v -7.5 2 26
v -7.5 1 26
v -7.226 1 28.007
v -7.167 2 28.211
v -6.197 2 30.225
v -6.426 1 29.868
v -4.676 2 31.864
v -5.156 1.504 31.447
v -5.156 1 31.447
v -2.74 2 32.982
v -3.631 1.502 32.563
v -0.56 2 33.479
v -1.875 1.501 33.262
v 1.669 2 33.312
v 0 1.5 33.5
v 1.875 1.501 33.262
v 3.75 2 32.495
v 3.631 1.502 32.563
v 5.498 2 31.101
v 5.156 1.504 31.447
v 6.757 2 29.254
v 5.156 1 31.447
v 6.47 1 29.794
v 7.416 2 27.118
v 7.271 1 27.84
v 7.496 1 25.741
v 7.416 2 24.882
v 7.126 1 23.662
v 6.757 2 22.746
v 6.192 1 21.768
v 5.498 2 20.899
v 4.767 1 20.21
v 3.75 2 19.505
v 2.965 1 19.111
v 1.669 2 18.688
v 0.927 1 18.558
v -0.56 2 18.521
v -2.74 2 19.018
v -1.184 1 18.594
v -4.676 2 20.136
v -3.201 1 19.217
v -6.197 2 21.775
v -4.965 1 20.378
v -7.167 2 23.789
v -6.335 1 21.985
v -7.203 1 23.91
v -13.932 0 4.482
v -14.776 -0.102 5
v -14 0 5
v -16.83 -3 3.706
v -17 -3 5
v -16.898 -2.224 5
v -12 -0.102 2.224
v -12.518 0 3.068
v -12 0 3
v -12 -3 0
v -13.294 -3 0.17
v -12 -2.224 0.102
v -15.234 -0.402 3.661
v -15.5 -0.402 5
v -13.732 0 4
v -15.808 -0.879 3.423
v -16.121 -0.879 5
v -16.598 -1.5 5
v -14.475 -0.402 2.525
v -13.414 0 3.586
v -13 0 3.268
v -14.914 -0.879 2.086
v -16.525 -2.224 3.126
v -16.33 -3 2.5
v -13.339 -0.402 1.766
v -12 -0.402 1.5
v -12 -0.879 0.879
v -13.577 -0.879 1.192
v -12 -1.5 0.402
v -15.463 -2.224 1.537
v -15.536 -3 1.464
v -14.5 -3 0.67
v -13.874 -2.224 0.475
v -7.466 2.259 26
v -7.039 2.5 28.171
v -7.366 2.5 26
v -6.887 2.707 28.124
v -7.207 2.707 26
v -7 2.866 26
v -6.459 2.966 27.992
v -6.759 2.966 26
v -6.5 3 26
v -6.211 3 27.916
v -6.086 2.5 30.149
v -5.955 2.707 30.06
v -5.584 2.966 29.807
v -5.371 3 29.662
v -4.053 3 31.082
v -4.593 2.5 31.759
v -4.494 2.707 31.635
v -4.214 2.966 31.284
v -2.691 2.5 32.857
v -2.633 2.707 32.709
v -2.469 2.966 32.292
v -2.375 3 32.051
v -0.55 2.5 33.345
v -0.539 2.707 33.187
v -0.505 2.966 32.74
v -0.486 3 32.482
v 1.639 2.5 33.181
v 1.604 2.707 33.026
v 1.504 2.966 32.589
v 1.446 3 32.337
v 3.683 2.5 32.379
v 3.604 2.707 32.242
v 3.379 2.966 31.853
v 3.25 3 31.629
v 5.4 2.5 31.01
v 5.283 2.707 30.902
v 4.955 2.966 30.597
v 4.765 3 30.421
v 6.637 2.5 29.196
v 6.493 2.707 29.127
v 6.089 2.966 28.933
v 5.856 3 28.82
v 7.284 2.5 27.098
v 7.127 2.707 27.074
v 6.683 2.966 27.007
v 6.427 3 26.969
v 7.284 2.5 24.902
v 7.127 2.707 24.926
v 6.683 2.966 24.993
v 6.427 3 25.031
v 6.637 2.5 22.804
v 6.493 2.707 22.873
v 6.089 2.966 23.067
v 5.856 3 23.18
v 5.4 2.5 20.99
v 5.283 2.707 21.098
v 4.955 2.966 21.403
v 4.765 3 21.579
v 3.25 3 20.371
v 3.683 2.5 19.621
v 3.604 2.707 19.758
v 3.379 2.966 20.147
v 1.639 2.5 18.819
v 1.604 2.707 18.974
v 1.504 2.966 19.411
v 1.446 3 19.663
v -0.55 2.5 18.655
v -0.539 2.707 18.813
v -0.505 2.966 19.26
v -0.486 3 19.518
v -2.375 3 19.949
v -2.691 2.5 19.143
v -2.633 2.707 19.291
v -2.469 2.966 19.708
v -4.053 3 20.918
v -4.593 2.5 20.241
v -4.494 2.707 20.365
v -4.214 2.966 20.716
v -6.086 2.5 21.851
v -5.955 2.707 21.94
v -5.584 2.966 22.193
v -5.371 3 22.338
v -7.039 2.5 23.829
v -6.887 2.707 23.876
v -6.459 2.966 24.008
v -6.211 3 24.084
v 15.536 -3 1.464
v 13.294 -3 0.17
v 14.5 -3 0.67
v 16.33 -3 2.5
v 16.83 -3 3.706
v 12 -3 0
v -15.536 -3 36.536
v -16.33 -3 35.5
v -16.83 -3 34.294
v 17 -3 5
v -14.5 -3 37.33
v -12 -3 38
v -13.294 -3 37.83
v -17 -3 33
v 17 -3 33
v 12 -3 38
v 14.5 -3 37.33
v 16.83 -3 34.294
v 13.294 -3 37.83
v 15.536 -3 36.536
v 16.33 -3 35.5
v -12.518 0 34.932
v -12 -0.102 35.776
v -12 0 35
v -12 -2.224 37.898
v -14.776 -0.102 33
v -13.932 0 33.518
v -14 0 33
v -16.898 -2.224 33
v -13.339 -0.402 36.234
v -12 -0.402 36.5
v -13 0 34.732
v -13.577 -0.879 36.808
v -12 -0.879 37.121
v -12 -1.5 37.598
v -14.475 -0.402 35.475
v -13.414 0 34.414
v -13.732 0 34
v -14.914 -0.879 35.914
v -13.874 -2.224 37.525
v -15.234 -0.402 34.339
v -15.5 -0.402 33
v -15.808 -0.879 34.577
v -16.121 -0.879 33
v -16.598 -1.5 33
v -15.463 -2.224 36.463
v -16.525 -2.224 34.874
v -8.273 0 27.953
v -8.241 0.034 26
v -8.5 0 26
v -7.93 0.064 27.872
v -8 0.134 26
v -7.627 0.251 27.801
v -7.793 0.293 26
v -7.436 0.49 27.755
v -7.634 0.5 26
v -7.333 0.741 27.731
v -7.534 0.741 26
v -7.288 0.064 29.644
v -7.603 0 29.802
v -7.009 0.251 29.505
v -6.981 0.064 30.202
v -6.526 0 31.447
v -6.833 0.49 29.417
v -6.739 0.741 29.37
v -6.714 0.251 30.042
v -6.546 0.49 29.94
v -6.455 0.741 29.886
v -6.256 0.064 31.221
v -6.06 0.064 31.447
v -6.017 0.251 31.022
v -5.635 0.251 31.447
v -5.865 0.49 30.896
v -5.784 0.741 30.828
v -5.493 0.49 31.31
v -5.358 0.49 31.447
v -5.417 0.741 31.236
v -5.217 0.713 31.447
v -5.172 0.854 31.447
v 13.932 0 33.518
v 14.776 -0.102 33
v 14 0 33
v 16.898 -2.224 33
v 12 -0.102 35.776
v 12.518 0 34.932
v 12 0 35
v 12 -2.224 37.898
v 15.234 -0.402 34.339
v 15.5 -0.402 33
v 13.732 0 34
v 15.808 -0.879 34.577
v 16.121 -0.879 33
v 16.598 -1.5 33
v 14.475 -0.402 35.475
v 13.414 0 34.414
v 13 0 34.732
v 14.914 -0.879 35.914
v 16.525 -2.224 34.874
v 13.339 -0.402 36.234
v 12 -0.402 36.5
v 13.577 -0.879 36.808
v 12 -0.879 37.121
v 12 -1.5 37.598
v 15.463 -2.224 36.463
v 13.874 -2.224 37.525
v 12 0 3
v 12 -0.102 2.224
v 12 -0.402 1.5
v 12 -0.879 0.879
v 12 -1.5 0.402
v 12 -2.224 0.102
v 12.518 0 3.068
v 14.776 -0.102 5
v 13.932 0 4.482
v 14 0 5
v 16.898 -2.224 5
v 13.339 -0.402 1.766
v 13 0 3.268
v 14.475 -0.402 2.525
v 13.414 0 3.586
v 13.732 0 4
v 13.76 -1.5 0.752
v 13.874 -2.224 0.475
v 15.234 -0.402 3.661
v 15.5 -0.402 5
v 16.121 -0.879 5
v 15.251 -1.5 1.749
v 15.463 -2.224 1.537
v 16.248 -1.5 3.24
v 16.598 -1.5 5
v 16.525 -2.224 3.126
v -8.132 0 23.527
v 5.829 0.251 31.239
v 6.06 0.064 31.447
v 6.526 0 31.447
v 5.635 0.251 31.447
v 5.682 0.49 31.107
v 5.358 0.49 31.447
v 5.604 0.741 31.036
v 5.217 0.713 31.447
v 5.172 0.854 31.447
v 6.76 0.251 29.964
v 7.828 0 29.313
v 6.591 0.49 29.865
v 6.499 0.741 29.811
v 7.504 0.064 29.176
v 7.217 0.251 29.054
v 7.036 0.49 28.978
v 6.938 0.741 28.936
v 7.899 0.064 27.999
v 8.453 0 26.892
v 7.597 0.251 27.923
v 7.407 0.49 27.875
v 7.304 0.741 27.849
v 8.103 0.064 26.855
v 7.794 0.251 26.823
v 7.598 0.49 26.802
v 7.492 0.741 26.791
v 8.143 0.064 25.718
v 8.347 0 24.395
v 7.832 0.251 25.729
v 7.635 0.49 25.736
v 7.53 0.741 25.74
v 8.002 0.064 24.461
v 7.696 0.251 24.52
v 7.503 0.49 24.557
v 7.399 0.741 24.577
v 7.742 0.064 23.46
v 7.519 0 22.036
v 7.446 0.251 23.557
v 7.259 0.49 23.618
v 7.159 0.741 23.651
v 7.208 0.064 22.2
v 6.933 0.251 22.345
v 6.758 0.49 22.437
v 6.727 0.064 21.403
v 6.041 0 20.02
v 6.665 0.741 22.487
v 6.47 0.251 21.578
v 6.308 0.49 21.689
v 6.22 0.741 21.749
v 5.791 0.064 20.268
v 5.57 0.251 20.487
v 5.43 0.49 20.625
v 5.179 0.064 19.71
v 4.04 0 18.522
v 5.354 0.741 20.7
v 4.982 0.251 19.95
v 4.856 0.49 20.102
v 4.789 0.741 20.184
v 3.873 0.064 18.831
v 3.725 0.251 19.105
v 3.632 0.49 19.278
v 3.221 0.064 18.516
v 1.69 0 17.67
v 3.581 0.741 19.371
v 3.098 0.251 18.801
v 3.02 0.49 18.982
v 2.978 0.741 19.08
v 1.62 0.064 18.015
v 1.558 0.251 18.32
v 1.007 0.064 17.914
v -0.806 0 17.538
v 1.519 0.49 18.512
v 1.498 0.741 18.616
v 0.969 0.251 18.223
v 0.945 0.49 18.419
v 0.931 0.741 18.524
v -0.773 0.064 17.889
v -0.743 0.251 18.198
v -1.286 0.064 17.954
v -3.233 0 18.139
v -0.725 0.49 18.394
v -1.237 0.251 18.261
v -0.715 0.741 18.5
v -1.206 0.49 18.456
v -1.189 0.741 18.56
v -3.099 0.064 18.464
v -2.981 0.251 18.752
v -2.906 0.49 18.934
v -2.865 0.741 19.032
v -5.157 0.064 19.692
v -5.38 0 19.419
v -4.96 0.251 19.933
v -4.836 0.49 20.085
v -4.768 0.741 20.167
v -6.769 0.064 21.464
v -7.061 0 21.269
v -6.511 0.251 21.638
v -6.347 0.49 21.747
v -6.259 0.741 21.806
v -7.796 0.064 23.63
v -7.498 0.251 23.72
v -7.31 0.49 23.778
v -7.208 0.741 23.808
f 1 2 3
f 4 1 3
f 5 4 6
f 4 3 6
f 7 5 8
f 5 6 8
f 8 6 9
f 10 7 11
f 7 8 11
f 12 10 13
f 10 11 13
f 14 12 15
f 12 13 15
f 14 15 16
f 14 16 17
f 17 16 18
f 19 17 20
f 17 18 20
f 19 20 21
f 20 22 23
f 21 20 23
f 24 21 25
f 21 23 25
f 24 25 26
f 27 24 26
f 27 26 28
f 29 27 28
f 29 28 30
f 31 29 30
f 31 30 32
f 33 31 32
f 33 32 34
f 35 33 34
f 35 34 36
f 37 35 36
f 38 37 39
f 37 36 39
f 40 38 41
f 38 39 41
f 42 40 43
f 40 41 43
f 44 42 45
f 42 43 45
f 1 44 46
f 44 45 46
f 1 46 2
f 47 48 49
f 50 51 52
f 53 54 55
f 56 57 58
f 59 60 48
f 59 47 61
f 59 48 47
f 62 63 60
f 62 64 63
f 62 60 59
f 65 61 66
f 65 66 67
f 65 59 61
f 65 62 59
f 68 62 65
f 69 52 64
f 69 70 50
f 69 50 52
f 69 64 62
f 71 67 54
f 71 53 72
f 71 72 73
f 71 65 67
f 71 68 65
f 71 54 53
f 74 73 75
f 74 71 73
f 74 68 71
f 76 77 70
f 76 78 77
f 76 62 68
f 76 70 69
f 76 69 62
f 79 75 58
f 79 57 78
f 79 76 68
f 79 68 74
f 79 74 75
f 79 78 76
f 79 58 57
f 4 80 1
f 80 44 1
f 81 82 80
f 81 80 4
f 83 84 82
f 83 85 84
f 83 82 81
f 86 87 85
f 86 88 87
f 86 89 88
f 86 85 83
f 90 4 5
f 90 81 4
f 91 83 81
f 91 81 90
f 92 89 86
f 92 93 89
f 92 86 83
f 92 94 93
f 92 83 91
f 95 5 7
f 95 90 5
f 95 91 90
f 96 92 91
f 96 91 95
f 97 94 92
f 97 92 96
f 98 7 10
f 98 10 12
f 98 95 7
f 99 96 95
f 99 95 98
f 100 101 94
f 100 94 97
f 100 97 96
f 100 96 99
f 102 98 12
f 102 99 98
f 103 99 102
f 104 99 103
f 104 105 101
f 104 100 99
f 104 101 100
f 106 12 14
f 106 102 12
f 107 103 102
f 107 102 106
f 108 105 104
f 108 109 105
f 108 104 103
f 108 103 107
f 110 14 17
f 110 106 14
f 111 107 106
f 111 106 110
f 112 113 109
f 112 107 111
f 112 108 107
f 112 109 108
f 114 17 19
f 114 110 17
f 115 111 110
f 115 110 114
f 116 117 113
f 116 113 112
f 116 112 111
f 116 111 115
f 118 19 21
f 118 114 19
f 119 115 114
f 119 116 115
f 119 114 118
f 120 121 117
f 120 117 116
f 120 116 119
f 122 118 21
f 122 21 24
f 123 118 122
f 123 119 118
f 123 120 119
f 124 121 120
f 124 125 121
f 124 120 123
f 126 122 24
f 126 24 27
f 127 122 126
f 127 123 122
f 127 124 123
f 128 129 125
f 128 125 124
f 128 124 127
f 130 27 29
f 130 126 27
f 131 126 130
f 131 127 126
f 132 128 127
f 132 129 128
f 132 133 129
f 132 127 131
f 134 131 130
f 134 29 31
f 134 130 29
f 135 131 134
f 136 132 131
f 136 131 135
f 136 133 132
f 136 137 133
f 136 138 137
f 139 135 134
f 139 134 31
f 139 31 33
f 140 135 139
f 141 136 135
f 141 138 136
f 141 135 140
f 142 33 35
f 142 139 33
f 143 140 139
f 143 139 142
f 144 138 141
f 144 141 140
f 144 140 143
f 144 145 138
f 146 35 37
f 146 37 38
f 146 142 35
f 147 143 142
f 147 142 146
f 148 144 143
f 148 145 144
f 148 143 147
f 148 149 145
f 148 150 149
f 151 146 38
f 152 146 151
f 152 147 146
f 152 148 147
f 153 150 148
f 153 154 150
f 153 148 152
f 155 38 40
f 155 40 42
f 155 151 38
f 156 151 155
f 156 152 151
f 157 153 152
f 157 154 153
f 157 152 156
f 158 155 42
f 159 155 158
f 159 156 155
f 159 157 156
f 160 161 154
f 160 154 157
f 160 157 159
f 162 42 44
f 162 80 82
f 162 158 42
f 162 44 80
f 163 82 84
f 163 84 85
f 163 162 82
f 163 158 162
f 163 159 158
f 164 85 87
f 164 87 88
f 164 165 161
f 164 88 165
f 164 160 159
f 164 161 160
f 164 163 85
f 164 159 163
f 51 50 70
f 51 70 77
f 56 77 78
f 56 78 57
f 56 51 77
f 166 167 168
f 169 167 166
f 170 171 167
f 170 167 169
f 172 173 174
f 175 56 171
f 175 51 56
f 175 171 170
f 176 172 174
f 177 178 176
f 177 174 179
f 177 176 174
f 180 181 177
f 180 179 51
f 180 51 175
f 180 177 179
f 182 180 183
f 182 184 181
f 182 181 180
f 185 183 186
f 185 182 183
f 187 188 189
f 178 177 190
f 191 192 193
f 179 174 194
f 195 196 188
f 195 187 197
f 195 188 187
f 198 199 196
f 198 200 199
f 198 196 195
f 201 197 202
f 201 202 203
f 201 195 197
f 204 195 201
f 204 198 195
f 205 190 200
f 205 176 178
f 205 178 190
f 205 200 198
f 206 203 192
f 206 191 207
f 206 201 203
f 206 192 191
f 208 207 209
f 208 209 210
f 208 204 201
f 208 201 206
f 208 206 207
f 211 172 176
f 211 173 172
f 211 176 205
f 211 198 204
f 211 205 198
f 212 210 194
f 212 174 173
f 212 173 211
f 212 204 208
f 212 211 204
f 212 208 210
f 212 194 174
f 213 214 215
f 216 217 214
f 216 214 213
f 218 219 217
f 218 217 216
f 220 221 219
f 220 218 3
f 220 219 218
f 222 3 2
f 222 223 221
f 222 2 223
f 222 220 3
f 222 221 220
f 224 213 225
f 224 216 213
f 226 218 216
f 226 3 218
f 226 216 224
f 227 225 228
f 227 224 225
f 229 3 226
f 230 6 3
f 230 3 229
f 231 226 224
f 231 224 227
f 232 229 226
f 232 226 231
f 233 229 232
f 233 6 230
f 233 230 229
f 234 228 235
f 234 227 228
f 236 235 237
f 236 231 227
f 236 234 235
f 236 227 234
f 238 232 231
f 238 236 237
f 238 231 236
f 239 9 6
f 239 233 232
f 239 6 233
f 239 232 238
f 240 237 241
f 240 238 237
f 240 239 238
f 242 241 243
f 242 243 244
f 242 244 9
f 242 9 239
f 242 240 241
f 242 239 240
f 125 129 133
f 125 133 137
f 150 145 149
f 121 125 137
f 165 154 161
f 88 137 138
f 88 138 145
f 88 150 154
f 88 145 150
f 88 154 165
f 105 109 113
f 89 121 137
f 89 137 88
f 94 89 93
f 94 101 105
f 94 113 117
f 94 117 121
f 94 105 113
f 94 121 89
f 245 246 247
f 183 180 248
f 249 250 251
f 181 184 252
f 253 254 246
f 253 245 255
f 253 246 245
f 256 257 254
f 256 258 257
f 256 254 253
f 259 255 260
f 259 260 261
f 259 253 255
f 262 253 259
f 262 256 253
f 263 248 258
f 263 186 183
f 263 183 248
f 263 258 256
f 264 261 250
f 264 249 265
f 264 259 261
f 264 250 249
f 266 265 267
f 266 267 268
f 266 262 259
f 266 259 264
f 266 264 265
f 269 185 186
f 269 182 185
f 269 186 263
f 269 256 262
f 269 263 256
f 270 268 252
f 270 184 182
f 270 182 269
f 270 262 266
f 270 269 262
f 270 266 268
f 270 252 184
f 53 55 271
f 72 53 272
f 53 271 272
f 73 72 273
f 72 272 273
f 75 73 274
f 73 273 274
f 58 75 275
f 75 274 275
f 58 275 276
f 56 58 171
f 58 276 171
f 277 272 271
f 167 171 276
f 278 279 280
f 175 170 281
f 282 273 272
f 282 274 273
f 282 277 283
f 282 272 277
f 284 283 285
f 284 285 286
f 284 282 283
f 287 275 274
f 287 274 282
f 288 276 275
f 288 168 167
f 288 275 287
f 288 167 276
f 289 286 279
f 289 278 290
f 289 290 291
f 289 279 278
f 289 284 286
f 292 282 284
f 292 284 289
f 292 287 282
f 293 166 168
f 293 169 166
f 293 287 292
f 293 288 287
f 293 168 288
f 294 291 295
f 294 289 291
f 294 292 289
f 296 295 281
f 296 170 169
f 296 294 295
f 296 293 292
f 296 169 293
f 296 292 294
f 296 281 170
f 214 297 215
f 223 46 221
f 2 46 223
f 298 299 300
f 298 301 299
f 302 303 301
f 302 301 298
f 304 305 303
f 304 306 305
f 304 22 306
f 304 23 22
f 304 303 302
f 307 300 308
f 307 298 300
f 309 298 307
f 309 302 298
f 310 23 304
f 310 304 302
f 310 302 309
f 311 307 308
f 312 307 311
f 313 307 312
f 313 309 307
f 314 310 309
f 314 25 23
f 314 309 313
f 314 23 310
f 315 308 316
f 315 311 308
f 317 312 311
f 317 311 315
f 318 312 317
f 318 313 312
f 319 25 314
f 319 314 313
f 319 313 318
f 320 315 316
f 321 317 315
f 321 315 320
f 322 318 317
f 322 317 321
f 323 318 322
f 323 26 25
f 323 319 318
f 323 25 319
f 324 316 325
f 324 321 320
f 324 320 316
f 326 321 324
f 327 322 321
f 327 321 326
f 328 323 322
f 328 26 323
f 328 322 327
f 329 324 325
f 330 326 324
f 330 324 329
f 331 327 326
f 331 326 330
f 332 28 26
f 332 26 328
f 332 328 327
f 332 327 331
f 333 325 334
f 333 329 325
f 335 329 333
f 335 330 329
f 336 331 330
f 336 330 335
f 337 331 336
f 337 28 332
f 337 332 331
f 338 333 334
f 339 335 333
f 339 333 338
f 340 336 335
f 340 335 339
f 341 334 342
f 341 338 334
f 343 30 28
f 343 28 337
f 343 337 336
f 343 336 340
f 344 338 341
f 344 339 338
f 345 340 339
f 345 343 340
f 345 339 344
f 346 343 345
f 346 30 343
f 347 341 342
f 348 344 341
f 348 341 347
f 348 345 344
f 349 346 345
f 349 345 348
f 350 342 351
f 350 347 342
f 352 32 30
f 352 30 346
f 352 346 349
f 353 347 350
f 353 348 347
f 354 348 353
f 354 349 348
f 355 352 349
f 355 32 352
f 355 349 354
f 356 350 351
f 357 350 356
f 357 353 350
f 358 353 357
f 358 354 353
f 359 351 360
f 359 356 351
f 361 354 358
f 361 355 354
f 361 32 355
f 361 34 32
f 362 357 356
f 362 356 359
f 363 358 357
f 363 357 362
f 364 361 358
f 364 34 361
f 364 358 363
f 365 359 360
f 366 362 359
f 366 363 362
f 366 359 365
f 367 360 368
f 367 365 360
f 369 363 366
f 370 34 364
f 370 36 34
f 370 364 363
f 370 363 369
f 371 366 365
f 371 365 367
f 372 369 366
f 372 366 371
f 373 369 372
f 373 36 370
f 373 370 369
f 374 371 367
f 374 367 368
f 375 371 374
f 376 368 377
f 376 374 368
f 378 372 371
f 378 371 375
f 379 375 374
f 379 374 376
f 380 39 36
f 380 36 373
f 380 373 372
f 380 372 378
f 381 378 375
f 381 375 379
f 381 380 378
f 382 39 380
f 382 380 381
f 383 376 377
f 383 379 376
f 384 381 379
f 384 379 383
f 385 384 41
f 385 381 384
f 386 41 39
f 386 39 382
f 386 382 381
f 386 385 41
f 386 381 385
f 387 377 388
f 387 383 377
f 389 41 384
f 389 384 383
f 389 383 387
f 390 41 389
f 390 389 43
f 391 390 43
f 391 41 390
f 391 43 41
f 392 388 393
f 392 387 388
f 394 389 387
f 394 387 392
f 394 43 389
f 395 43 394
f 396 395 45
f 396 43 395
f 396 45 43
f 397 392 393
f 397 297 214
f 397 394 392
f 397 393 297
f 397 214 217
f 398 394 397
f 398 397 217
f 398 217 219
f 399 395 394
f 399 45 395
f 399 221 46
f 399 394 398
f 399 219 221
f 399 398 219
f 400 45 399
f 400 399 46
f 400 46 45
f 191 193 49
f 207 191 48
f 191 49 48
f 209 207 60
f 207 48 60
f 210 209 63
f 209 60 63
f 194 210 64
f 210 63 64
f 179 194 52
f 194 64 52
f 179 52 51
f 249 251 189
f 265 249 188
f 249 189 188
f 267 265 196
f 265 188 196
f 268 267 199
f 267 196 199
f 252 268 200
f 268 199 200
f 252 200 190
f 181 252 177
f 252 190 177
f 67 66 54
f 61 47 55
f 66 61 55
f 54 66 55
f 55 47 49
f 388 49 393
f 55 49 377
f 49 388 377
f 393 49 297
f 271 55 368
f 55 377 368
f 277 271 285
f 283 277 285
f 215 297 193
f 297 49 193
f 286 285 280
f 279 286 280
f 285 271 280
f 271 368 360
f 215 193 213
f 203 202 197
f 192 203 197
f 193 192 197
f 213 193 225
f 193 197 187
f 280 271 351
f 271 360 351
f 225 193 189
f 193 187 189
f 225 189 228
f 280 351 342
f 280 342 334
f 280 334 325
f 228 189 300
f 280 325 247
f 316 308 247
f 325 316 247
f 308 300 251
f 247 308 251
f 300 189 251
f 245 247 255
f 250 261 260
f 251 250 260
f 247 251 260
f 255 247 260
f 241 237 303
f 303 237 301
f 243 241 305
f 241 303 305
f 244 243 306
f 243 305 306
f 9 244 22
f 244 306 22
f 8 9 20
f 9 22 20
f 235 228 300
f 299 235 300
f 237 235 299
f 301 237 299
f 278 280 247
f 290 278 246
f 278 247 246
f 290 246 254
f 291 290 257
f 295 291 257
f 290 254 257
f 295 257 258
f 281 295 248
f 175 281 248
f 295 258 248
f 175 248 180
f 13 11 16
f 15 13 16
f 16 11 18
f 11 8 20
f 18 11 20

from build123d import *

# Parameters (mm, degrees)
F1_DEPTH = 3
F2_R     = 7.5
F3_DEPTH = 3
F5_DEPTH = 12.5
F6_R     = 2.99999
F7_R     = 1


# Not quite as in the source:
# - a fillet or chamfer is up to 0.001 mm smaller than in the source, because OpenCascade refuses the exact size


with BuildPart() as f1:
    # F0 (on Front) → F1 (new body)
    with BuildSketch(Plane.XZ):
        with BuildLine():
            ThreePointArc((-17, 5), (-15.5355339059, 1.4644660941), (-12, 0))
            Line((-12, 0), (12, 0))
            ThreePointArc((12, 0), (15.5355339059, 1.4644660941), (17, 5))
            Line((17, 5), (17, 33))
            ThreePointArc((17, 33), (15.5355339059, 36.5355339059), (12, 38))
            Line((12, 38), (-12, 38))
            ThreePointArc((-12, 38), (-15.5355339059, 36.5355339059), (-17, 33))
            Line((-17, 33), (-17, 5))
        make_face()
    extrude(amount=F1_DEPTH)

    # F2 (on face) → F3 (join)
    with BuildSketch(Plane(origin=(0, 0, 0), x_dir=(-1, 0, 0), z_dir=(0, 1, 0))):
        with Locations((0, 26)):
            Circle(F2_R)
    extrude(amount=F3_DEPTH)

    # F4 (on Right) → F5 (cut, symmetric)
    with BuildSketch(Plane.YZ):
        Polygon((1.5, 33.5), (0, 33.5), (0, 31.4465926395), (1.504468584, 31.4465926395), align=None)
    extrude(amount=F5_DEPTH, both=True, mode=Mode.SUBTRACT)

    # F6 (radius 3 in the source; OpenCascade refuses exactly that, so slightly less here)
    f6_edges = [f1.edges().sort_by_distance(p)[0] for p in [
        (17, 0, 19),
    ]]
    fillet(f6_edges, radius=F6_R)

    # F7
    f7_edges = [f1.edges().sort_by_distance(p)[0] for p in [
        (7.5, 3, 26),
        (2.964775, 0, 19.11087),
    ]]
    fillet(f7_edges, radius=F7_R)


solid = f1.part
